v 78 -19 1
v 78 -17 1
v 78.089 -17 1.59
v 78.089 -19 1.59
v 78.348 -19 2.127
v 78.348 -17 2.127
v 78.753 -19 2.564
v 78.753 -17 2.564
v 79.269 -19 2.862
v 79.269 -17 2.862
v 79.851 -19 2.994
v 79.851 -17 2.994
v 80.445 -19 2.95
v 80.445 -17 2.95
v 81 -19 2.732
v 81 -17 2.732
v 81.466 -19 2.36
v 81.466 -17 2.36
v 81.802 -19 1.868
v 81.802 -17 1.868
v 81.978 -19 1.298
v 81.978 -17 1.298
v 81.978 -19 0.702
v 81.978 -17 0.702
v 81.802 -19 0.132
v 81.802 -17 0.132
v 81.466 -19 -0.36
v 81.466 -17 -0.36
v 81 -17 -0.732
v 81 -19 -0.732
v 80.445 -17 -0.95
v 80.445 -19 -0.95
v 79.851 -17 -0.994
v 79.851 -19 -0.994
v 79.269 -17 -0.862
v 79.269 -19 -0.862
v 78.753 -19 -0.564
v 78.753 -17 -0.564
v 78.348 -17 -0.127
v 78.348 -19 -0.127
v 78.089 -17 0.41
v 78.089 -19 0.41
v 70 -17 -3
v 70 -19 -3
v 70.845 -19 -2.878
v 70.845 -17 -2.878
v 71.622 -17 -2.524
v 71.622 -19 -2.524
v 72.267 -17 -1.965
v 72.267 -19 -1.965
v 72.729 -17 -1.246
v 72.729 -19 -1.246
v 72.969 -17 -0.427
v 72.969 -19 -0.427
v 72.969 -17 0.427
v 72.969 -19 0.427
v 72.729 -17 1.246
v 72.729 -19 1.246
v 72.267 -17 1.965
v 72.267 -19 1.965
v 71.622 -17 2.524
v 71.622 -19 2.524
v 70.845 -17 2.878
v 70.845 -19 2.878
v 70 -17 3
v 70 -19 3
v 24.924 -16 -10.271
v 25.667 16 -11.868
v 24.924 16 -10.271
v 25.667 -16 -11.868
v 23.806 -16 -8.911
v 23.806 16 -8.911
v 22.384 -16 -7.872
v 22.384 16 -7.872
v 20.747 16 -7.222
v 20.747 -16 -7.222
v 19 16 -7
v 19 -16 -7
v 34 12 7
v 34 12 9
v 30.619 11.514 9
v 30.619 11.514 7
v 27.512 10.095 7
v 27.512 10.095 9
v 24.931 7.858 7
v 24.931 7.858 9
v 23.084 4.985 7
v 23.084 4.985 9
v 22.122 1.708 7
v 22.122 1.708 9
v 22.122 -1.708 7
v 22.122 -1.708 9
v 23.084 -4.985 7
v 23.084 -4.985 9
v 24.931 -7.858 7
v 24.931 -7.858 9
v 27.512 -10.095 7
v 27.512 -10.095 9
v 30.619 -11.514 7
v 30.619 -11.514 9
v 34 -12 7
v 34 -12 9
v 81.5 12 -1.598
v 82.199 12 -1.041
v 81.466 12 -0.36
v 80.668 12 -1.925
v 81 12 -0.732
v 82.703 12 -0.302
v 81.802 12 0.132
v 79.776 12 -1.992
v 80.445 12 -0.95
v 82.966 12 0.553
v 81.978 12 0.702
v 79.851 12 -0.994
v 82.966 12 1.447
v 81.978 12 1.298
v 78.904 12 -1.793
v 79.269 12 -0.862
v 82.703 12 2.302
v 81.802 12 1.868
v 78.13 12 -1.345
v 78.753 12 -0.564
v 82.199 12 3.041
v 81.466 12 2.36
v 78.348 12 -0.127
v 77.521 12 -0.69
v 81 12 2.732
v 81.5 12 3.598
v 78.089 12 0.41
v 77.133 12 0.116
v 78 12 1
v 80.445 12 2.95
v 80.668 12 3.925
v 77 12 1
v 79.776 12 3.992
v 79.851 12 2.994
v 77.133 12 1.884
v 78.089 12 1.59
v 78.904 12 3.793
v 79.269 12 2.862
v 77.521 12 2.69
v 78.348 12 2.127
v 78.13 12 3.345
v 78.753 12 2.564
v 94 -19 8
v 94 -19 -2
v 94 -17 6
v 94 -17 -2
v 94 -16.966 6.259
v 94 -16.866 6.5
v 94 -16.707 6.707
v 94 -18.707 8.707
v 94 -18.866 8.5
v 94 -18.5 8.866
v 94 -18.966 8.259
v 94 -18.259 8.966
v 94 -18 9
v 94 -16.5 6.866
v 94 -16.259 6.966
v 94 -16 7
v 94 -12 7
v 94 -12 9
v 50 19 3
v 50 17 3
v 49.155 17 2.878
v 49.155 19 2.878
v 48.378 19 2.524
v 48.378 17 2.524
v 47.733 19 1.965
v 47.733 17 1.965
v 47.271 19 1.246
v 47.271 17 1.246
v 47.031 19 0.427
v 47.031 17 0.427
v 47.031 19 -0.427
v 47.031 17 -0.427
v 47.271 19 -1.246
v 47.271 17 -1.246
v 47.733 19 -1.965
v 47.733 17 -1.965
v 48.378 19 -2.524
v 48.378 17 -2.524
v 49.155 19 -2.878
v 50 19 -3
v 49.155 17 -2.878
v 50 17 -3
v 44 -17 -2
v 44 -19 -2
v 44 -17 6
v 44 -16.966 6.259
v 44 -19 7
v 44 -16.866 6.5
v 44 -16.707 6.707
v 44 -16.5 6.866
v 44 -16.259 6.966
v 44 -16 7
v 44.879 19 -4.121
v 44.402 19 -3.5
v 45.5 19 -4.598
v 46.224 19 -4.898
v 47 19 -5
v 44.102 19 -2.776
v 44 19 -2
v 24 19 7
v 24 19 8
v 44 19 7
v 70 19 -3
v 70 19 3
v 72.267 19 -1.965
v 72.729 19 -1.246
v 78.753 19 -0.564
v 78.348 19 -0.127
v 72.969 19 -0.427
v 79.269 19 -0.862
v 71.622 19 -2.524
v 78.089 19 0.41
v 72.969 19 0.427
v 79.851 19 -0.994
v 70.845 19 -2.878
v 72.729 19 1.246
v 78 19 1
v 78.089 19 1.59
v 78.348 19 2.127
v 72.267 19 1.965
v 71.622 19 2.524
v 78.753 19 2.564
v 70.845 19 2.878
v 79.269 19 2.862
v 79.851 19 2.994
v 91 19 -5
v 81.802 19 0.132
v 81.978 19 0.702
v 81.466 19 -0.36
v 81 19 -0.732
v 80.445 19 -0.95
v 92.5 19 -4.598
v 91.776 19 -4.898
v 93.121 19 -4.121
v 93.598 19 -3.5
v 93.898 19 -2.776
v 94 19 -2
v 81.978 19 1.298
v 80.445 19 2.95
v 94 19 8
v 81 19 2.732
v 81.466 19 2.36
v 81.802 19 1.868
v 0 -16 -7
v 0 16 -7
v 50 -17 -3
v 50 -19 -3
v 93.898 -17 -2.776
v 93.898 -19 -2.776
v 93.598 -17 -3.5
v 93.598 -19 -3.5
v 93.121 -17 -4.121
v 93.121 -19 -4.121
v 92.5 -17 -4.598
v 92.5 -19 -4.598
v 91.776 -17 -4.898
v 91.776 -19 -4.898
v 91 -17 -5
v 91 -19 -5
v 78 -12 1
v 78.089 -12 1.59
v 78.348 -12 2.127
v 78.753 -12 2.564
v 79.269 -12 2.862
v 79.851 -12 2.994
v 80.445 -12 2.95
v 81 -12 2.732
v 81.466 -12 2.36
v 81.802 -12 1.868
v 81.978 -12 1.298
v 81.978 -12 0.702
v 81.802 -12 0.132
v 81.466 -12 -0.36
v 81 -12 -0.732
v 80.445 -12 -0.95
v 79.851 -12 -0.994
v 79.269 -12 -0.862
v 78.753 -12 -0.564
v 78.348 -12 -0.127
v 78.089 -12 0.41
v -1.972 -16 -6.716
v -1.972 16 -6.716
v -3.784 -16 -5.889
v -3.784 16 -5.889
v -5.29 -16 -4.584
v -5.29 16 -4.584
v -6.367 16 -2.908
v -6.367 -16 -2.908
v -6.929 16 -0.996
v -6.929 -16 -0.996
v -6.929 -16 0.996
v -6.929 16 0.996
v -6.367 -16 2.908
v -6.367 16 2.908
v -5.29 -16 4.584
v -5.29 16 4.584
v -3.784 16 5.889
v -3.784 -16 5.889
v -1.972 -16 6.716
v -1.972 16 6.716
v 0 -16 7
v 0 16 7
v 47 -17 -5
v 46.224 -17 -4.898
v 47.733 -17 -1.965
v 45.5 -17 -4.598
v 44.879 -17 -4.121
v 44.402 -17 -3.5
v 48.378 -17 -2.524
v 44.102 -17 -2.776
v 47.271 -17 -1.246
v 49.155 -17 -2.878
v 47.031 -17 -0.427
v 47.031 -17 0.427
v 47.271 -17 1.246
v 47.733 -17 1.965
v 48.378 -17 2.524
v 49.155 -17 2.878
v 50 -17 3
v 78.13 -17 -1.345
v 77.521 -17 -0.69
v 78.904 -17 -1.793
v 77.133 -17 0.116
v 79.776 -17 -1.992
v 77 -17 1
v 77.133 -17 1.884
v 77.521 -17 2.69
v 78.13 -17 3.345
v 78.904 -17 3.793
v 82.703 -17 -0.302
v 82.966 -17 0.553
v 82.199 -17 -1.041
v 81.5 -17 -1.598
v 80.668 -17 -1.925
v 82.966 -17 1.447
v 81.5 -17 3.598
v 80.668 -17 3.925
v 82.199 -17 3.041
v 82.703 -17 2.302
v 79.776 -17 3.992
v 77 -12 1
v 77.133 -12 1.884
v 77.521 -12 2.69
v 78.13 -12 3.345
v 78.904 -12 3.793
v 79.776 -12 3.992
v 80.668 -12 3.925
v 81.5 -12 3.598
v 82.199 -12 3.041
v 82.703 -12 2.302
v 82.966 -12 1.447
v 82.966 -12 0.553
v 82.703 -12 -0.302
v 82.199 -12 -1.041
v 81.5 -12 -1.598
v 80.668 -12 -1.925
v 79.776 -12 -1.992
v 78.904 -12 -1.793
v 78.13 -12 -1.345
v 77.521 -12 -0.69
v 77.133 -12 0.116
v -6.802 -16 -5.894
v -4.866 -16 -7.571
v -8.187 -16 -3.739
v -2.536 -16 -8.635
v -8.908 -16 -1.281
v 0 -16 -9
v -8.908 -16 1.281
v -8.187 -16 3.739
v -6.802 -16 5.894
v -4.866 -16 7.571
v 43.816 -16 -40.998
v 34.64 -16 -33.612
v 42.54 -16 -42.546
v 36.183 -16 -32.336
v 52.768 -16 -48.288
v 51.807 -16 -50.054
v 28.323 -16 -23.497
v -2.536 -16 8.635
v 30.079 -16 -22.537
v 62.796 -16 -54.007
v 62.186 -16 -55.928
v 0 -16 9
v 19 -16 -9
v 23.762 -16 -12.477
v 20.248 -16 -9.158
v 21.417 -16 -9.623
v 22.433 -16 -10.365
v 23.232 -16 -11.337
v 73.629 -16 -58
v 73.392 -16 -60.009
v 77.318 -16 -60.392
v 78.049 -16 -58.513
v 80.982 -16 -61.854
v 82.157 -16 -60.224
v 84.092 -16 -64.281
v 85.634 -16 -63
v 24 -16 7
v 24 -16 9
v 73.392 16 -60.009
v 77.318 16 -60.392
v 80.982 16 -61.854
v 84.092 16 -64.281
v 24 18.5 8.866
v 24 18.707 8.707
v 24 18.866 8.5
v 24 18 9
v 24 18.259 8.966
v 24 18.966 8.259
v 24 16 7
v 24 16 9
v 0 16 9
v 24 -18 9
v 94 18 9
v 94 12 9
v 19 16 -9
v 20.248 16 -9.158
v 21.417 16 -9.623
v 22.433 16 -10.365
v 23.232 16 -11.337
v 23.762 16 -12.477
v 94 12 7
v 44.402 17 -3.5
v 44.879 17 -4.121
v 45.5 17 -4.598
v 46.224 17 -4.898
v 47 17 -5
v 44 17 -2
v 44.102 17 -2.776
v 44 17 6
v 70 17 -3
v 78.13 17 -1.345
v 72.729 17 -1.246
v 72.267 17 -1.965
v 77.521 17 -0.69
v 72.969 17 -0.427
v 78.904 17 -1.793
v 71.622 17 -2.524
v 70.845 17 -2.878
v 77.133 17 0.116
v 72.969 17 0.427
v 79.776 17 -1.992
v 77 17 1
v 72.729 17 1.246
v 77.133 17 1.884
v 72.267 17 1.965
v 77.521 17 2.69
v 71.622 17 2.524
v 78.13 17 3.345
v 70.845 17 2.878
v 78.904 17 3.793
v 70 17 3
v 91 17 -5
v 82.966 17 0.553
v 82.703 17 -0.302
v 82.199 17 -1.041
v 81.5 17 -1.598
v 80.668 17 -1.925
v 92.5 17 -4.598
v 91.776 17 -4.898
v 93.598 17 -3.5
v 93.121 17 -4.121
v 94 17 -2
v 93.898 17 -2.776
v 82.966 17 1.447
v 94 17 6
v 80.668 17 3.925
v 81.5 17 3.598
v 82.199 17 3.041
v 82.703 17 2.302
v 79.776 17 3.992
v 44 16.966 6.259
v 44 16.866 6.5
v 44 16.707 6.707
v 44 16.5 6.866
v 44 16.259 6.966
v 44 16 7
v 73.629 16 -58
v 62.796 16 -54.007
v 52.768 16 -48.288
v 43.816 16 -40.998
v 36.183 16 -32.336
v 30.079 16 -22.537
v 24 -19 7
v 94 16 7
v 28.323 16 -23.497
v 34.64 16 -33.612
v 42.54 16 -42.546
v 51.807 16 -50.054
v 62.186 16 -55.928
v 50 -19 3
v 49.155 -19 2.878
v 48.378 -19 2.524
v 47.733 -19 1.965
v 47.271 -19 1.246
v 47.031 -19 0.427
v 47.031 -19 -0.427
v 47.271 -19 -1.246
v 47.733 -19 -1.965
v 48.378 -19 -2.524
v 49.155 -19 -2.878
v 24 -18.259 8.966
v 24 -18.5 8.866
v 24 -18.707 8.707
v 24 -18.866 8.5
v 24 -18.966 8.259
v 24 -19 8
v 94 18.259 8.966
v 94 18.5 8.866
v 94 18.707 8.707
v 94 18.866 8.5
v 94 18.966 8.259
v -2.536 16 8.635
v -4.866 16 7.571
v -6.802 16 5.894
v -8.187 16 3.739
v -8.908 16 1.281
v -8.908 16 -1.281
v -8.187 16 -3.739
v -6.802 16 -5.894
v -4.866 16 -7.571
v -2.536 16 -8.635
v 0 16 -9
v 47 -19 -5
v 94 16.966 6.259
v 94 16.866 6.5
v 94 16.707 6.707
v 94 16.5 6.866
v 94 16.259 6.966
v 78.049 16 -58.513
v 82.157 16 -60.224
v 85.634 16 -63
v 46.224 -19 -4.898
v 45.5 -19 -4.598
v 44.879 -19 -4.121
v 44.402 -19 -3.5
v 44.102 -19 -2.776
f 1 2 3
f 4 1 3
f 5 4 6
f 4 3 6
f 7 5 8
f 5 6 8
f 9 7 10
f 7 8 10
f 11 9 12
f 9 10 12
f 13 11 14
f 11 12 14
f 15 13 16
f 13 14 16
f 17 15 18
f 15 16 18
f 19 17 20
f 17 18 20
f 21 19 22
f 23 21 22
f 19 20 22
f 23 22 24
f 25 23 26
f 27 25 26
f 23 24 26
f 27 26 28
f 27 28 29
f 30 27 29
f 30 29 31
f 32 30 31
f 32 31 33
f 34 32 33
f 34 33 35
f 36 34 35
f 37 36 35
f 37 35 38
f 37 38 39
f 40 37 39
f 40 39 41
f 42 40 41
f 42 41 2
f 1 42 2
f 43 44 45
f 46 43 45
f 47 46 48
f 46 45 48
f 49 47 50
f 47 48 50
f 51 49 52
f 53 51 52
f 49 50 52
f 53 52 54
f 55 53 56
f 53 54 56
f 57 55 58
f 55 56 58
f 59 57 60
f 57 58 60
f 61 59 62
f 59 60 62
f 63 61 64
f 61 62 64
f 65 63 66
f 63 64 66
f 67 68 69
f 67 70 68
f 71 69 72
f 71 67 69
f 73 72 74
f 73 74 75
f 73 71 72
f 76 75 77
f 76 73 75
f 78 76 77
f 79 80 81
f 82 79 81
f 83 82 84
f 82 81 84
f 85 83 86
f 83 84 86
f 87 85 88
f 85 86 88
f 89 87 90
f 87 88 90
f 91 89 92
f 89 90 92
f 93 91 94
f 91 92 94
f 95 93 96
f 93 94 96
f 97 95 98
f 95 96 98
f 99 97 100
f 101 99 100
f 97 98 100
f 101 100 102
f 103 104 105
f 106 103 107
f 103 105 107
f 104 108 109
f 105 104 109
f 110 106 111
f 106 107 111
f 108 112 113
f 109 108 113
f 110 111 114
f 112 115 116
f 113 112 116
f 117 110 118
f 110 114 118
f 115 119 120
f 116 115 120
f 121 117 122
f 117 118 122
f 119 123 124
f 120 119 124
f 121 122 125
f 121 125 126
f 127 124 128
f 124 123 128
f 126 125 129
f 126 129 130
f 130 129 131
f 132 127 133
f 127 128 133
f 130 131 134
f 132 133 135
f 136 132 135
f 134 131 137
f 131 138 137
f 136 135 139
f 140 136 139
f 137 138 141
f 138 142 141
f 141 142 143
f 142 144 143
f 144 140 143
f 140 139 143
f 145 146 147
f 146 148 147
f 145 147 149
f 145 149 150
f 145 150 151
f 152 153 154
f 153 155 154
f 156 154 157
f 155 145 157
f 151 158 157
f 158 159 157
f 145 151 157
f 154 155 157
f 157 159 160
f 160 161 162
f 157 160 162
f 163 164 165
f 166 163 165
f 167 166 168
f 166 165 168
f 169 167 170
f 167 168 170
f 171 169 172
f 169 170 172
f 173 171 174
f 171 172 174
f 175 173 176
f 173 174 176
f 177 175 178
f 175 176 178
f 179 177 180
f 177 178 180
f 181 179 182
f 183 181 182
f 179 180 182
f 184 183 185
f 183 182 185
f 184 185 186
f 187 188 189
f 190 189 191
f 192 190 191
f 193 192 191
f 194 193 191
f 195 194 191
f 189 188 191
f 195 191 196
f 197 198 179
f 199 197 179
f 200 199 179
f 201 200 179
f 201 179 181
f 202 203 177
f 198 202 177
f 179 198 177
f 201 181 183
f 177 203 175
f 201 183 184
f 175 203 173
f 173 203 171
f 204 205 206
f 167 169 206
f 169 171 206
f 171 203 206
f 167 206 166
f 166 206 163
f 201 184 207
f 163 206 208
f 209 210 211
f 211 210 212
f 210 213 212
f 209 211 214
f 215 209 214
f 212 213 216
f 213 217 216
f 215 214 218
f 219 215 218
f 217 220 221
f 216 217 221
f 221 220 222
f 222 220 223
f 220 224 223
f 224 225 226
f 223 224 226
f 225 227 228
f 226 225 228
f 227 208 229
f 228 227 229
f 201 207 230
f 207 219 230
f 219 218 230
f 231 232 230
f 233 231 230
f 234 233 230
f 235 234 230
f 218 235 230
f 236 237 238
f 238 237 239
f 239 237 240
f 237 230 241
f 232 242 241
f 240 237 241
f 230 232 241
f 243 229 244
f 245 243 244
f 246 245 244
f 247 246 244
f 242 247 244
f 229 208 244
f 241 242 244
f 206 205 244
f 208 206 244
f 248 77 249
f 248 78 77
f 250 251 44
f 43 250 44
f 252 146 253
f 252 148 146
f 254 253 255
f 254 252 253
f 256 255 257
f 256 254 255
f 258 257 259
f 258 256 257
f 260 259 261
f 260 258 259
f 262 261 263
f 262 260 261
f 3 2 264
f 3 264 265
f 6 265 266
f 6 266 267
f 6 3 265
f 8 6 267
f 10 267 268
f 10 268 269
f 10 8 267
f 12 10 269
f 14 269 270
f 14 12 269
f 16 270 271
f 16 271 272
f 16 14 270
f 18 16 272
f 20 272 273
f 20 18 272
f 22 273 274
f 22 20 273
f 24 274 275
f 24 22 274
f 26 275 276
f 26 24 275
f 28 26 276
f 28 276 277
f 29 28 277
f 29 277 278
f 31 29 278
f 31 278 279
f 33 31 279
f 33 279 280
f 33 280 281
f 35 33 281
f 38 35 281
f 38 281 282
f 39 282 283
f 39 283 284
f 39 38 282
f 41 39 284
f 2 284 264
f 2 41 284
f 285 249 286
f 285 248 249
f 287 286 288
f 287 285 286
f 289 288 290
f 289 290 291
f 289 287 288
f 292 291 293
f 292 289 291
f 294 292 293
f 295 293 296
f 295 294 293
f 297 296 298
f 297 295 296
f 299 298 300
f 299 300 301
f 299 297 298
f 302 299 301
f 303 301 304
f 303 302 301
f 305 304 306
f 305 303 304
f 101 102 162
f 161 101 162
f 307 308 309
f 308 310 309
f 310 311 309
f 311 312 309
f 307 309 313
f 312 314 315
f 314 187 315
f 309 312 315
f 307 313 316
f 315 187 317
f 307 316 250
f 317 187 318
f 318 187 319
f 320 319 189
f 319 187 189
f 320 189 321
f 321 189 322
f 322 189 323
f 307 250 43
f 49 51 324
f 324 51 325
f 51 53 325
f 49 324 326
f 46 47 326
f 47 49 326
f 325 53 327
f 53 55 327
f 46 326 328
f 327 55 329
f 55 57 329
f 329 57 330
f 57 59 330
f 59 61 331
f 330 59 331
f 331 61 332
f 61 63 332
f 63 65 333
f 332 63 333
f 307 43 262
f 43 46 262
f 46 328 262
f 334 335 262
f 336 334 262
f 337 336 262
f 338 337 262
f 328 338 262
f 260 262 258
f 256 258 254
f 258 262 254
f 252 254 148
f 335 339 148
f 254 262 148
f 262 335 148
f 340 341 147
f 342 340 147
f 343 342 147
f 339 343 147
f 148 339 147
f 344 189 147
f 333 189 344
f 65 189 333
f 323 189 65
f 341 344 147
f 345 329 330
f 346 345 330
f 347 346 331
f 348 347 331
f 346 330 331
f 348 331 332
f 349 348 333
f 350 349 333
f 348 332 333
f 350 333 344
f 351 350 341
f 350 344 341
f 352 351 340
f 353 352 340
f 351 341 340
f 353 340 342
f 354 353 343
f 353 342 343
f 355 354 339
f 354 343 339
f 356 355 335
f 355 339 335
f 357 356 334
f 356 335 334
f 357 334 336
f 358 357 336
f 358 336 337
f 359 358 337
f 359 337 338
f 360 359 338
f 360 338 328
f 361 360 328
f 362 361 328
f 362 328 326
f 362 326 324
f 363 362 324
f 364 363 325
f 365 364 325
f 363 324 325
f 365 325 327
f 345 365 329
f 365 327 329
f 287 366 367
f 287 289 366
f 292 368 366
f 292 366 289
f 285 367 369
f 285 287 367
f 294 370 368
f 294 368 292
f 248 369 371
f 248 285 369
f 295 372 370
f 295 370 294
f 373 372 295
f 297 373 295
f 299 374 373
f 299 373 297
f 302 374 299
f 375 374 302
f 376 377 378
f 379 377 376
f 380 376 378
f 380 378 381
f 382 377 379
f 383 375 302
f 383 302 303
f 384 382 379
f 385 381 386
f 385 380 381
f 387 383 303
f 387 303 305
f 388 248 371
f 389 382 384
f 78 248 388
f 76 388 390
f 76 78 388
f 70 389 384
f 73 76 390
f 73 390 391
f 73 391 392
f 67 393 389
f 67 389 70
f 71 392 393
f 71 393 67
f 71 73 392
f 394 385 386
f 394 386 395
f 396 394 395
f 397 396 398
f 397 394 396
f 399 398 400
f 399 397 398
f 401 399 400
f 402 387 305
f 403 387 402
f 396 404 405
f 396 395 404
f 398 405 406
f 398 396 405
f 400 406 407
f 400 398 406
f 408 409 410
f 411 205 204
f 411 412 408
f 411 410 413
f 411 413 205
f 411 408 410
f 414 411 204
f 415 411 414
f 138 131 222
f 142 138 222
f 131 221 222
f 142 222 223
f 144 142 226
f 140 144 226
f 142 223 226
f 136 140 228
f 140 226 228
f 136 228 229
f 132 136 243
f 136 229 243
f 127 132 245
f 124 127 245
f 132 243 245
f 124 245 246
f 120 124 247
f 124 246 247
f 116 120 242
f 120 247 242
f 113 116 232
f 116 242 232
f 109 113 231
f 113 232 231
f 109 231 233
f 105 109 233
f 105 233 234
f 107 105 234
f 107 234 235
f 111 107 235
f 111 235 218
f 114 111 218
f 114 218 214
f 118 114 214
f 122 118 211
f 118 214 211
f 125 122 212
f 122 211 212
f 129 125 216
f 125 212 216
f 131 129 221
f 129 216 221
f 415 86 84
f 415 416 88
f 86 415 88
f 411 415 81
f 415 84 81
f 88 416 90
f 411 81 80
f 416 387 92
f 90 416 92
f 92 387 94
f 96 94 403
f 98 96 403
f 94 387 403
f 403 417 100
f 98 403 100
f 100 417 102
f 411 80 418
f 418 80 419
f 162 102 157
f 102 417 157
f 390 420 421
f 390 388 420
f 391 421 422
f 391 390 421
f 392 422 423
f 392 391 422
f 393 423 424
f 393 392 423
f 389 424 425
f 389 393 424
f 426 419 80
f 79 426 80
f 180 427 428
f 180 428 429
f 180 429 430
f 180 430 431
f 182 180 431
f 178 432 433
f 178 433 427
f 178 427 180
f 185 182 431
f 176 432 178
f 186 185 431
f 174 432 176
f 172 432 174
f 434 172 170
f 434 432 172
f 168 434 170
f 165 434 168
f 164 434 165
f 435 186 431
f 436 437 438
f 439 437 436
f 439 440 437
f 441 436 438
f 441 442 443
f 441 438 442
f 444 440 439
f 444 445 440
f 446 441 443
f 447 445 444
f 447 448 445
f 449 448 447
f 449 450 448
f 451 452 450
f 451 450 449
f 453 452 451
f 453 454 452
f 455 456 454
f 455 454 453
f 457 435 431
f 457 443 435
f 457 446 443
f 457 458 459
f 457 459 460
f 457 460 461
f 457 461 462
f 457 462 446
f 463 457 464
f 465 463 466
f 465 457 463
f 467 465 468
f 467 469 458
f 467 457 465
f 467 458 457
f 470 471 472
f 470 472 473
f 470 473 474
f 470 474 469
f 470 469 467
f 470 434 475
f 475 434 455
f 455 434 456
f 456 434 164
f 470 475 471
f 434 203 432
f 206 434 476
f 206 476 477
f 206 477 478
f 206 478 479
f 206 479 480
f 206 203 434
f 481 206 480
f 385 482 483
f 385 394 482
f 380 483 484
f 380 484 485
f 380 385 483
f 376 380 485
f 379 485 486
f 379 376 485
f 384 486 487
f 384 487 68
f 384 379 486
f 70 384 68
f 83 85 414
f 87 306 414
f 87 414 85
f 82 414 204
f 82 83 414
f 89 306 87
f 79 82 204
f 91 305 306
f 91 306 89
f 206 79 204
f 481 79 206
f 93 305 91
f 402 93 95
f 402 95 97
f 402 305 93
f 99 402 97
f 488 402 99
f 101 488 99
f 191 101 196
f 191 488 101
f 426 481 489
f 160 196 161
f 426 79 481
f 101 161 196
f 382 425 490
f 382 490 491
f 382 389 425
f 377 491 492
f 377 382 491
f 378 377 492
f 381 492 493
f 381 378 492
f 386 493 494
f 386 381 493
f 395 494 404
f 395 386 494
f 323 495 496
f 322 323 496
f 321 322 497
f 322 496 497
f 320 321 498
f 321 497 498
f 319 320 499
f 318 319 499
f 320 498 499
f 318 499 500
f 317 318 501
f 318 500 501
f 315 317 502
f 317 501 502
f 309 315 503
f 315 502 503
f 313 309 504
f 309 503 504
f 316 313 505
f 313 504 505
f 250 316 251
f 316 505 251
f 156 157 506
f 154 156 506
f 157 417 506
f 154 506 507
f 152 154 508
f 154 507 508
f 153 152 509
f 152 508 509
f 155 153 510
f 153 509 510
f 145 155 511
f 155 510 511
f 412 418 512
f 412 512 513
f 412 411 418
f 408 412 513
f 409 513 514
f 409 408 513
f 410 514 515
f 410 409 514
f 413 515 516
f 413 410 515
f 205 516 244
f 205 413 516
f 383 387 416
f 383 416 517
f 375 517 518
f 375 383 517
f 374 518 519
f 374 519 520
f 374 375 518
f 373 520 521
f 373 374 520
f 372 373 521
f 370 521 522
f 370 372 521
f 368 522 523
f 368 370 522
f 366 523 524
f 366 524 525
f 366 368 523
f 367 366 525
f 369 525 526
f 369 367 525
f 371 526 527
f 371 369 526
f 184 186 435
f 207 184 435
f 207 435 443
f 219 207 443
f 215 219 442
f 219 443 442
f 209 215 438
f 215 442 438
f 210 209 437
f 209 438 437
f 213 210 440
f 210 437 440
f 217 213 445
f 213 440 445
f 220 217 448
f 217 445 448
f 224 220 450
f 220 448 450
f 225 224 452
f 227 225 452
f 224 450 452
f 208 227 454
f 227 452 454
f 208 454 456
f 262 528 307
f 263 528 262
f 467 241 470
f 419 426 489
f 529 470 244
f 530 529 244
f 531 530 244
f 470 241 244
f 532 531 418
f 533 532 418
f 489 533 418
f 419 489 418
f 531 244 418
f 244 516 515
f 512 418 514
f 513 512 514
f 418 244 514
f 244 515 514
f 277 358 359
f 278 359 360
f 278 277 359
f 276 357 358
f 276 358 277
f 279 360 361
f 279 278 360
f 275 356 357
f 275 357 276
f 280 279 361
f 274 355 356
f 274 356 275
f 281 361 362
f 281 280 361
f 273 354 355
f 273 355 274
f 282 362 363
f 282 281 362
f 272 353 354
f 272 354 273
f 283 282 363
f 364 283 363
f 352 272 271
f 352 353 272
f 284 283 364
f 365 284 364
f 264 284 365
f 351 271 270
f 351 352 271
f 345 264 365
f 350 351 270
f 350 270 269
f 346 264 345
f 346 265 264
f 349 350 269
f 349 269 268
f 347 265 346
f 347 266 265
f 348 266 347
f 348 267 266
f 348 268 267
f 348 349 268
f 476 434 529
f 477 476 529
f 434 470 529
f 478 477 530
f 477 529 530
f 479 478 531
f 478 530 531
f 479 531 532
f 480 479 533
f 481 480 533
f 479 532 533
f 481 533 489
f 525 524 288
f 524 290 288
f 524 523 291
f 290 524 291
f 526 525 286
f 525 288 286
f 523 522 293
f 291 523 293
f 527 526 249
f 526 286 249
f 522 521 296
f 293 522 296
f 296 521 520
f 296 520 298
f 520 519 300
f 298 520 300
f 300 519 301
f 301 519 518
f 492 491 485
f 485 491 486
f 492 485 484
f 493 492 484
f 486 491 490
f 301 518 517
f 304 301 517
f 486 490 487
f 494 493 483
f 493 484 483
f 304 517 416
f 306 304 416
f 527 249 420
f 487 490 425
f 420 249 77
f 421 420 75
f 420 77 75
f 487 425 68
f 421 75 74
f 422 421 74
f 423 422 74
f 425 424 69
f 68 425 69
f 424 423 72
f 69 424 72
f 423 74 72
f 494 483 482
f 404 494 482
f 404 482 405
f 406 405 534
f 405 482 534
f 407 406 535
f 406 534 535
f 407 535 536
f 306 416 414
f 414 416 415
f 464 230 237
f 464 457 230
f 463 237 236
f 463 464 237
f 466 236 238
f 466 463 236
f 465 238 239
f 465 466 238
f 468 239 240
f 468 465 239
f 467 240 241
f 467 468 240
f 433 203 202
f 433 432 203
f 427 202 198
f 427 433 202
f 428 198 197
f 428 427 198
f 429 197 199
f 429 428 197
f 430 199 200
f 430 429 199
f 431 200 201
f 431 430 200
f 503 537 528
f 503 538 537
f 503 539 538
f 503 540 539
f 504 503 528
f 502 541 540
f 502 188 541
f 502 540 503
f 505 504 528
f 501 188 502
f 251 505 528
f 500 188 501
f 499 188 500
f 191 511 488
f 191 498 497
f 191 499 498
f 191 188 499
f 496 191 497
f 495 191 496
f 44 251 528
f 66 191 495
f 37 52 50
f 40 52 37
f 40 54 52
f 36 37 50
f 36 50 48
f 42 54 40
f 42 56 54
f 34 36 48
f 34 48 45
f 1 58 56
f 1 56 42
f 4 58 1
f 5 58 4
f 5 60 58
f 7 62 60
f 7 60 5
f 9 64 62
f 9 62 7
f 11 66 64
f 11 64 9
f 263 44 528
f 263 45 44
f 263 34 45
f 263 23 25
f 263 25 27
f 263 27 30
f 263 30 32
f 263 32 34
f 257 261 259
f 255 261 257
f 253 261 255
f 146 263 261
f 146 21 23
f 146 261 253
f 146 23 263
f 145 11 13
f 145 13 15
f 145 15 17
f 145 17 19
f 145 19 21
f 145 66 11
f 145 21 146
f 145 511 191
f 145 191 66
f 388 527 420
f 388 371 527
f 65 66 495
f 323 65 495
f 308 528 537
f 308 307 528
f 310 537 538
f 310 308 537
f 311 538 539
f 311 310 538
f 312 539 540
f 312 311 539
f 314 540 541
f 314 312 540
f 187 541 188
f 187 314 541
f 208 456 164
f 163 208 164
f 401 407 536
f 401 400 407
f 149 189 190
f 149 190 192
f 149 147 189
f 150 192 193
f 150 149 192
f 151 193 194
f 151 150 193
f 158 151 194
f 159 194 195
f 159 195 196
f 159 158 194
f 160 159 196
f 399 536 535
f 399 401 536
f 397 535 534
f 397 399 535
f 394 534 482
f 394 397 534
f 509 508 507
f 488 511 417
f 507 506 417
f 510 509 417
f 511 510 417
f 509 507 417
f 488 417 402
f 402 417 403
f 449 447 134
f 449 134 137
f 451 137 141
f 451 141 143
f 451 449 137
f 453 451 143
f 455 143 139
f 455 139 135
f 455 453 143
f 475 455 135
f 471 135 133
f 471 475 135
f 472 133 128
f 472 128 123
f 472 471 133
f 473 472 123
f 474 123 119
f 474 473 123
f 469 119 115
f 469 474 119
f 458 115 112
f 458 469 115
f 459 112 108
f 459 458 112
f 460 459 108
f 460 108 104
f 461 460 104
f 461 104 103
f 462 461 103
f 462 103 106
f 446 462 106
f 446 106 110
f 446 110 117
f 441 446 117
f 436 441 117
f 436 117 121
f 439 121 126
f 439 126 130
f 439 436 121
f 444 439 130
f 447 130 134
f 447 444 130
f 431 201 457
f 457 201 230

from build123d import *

# Parameters (mm, degrees)
F1_DEPTH  = 16
F2_W      = 70
F2_H      = 3
F3_DEPTH  = 2
F4_W      = 50
F4_H      = 14
F5_DEPTH  = 2
F6_R      = 1
F9_DEPTH  = 2
F11_DEPTH = 38.001
F13_D     = 4
F14_R     = 3
F14_R_2   = 2
F15_DEPTH = 5
F16_R     = 3


# Not quite as in the source:
# - a pattern or mirror of a feature is missing from the dataset's text; its kind, count and spacing are read off the source's solid


with BuildPart() as f1:
    # F0 (on Front) → F1 (new body)
    with BuildSketch(Plane.XZ):
        with BuildLine():
            Line((94, 9), (0, 9))
            ThreePointArc((0, 9), (-9, 0), (0, -9))
            Line((0, -9), (19, -9))
            ThreePointArc((19, -9), (21.9483530121, -9.9617807742), (23.7624383273, -12.4771141937))
            ThreePointArc((23.7624383273, -12.4771141937), (42.5404984663, -42.5461666629), (73.3918884835, -60.0091329916))
            ThreePointArc((73.3918884835, -60.0091329916), (79.2017940664, -60.9932244785), (84.0921252778, -64.2807919045))
            Line((84.0921252778, -64.2807919045), (85.6344375761, -63))
            ThreePointArc((85.6344375761, -63), (80.1625330731, -59.2251678092), (73.628769931, -58))
            ThreePointArc((73.628769931, -58), (43.8155502437, -40.9978046119), (25.6674136582, -11.8679598712))
            ThreePointArc((25.6674136582, -11.8679598712), (23.127694217, -8.3464930839), (19, -7))
            Line((19, -7), (0, -7))
            ThreePointArc((0, -7), (-7, 0), (0, 7))
            Line((0, 7), (94, 7))
            Line((94, 7), (94, 9))
        make_face()
    extrude(amount=F1_DEPTH)

    # F2 (on face) → F3 (join)
    with BuildSketch(Plane.XY.offset(9)):
        with Locations((59, -17.5)):
            Rectangle(F2_W, F2_H)
    extrude(amount=-F3_DEPTH)

    # F4 (on face) → F5 (join)
    with BuildSketch(Plane.XZ.offset(19)):
        with Locations((69, 2)):
            Rectangle(F4_W, F4_H)
    extrude(amount=-F5_DEPTH)

    # F6
    f6_edges = [f1.edges().sort_by_distance(p)[0] for p in [
        (69, -17, 7),
        (59, -19, 9),
    ]]
    fillet(f6_edges, radius=F6_R)

    # F7: F1 across plane


with BuildPart() as f1_1:
    add(f1.part)
    add(f1.part.mirror(Plane.XZ))

    # F8 (on face) → F9 (cut)
    with BuildSketch(Plane.XY.offset(9)):
        with BuildLine():
            Line((94, 12), (34, 12))
            ThreePointArc((34, 12), (22, 0), (34, -12))
            Line((34, -12), (94, -12))
            Line((94, -12), (94, 12))
        make_face()
    extrude(amount=-F9_DEPTH, mode=Mode.SUBTRACT)

    # F10 (on face) → F11 (cut, through all)
    with BuildSketch(Plane.XZ.offset(19)):
        with BuildLine():
            ThreePointArc((50, 3), (47, 0), (50, -3))
            Line((50, -3), (70, -3))
            ThreePointArc((70, -3), (73, 0), (70, 3))
            Line((70, 3), (50, 3))
        make_face()
    extrude(amount=-F11_DEPTH, mode=Mode.SUBTRACT)

    # F13 (through all)
    with Locations(Plane.XZ.offset(19)):
        with Locations((80, 1)):
            Hole(F13_D / 2)

    # F14 (on face) → F15 (join)
    with BuildSketch(Plane(origin=(0, -17, 0), x_dir=(-1, 0, 0), z_dir=(0, 1, 0))):
        with Locations((-80, 1)):
            Circle(F14_R)
        with Locations((-80, 1)):
            Circle(F14_R_2, mode=Mode.SUBTRACT)
    f15 = extrude(amount=F15_DEPTH)

    # F15_copies: F15 across plane
    add(f15.mirror(Plane.ZX))

    # F16
    f16_edges = [f1_1.edges().sort_by_distance(p)[0] for p in [
        (94, -18, -5),
        (94, 18, -5),
        (44, 18, -5),
        (44, -18, -5),
    ]]
    fillet(f16_edges, radius=F16_R)


solid = f1_1.part
